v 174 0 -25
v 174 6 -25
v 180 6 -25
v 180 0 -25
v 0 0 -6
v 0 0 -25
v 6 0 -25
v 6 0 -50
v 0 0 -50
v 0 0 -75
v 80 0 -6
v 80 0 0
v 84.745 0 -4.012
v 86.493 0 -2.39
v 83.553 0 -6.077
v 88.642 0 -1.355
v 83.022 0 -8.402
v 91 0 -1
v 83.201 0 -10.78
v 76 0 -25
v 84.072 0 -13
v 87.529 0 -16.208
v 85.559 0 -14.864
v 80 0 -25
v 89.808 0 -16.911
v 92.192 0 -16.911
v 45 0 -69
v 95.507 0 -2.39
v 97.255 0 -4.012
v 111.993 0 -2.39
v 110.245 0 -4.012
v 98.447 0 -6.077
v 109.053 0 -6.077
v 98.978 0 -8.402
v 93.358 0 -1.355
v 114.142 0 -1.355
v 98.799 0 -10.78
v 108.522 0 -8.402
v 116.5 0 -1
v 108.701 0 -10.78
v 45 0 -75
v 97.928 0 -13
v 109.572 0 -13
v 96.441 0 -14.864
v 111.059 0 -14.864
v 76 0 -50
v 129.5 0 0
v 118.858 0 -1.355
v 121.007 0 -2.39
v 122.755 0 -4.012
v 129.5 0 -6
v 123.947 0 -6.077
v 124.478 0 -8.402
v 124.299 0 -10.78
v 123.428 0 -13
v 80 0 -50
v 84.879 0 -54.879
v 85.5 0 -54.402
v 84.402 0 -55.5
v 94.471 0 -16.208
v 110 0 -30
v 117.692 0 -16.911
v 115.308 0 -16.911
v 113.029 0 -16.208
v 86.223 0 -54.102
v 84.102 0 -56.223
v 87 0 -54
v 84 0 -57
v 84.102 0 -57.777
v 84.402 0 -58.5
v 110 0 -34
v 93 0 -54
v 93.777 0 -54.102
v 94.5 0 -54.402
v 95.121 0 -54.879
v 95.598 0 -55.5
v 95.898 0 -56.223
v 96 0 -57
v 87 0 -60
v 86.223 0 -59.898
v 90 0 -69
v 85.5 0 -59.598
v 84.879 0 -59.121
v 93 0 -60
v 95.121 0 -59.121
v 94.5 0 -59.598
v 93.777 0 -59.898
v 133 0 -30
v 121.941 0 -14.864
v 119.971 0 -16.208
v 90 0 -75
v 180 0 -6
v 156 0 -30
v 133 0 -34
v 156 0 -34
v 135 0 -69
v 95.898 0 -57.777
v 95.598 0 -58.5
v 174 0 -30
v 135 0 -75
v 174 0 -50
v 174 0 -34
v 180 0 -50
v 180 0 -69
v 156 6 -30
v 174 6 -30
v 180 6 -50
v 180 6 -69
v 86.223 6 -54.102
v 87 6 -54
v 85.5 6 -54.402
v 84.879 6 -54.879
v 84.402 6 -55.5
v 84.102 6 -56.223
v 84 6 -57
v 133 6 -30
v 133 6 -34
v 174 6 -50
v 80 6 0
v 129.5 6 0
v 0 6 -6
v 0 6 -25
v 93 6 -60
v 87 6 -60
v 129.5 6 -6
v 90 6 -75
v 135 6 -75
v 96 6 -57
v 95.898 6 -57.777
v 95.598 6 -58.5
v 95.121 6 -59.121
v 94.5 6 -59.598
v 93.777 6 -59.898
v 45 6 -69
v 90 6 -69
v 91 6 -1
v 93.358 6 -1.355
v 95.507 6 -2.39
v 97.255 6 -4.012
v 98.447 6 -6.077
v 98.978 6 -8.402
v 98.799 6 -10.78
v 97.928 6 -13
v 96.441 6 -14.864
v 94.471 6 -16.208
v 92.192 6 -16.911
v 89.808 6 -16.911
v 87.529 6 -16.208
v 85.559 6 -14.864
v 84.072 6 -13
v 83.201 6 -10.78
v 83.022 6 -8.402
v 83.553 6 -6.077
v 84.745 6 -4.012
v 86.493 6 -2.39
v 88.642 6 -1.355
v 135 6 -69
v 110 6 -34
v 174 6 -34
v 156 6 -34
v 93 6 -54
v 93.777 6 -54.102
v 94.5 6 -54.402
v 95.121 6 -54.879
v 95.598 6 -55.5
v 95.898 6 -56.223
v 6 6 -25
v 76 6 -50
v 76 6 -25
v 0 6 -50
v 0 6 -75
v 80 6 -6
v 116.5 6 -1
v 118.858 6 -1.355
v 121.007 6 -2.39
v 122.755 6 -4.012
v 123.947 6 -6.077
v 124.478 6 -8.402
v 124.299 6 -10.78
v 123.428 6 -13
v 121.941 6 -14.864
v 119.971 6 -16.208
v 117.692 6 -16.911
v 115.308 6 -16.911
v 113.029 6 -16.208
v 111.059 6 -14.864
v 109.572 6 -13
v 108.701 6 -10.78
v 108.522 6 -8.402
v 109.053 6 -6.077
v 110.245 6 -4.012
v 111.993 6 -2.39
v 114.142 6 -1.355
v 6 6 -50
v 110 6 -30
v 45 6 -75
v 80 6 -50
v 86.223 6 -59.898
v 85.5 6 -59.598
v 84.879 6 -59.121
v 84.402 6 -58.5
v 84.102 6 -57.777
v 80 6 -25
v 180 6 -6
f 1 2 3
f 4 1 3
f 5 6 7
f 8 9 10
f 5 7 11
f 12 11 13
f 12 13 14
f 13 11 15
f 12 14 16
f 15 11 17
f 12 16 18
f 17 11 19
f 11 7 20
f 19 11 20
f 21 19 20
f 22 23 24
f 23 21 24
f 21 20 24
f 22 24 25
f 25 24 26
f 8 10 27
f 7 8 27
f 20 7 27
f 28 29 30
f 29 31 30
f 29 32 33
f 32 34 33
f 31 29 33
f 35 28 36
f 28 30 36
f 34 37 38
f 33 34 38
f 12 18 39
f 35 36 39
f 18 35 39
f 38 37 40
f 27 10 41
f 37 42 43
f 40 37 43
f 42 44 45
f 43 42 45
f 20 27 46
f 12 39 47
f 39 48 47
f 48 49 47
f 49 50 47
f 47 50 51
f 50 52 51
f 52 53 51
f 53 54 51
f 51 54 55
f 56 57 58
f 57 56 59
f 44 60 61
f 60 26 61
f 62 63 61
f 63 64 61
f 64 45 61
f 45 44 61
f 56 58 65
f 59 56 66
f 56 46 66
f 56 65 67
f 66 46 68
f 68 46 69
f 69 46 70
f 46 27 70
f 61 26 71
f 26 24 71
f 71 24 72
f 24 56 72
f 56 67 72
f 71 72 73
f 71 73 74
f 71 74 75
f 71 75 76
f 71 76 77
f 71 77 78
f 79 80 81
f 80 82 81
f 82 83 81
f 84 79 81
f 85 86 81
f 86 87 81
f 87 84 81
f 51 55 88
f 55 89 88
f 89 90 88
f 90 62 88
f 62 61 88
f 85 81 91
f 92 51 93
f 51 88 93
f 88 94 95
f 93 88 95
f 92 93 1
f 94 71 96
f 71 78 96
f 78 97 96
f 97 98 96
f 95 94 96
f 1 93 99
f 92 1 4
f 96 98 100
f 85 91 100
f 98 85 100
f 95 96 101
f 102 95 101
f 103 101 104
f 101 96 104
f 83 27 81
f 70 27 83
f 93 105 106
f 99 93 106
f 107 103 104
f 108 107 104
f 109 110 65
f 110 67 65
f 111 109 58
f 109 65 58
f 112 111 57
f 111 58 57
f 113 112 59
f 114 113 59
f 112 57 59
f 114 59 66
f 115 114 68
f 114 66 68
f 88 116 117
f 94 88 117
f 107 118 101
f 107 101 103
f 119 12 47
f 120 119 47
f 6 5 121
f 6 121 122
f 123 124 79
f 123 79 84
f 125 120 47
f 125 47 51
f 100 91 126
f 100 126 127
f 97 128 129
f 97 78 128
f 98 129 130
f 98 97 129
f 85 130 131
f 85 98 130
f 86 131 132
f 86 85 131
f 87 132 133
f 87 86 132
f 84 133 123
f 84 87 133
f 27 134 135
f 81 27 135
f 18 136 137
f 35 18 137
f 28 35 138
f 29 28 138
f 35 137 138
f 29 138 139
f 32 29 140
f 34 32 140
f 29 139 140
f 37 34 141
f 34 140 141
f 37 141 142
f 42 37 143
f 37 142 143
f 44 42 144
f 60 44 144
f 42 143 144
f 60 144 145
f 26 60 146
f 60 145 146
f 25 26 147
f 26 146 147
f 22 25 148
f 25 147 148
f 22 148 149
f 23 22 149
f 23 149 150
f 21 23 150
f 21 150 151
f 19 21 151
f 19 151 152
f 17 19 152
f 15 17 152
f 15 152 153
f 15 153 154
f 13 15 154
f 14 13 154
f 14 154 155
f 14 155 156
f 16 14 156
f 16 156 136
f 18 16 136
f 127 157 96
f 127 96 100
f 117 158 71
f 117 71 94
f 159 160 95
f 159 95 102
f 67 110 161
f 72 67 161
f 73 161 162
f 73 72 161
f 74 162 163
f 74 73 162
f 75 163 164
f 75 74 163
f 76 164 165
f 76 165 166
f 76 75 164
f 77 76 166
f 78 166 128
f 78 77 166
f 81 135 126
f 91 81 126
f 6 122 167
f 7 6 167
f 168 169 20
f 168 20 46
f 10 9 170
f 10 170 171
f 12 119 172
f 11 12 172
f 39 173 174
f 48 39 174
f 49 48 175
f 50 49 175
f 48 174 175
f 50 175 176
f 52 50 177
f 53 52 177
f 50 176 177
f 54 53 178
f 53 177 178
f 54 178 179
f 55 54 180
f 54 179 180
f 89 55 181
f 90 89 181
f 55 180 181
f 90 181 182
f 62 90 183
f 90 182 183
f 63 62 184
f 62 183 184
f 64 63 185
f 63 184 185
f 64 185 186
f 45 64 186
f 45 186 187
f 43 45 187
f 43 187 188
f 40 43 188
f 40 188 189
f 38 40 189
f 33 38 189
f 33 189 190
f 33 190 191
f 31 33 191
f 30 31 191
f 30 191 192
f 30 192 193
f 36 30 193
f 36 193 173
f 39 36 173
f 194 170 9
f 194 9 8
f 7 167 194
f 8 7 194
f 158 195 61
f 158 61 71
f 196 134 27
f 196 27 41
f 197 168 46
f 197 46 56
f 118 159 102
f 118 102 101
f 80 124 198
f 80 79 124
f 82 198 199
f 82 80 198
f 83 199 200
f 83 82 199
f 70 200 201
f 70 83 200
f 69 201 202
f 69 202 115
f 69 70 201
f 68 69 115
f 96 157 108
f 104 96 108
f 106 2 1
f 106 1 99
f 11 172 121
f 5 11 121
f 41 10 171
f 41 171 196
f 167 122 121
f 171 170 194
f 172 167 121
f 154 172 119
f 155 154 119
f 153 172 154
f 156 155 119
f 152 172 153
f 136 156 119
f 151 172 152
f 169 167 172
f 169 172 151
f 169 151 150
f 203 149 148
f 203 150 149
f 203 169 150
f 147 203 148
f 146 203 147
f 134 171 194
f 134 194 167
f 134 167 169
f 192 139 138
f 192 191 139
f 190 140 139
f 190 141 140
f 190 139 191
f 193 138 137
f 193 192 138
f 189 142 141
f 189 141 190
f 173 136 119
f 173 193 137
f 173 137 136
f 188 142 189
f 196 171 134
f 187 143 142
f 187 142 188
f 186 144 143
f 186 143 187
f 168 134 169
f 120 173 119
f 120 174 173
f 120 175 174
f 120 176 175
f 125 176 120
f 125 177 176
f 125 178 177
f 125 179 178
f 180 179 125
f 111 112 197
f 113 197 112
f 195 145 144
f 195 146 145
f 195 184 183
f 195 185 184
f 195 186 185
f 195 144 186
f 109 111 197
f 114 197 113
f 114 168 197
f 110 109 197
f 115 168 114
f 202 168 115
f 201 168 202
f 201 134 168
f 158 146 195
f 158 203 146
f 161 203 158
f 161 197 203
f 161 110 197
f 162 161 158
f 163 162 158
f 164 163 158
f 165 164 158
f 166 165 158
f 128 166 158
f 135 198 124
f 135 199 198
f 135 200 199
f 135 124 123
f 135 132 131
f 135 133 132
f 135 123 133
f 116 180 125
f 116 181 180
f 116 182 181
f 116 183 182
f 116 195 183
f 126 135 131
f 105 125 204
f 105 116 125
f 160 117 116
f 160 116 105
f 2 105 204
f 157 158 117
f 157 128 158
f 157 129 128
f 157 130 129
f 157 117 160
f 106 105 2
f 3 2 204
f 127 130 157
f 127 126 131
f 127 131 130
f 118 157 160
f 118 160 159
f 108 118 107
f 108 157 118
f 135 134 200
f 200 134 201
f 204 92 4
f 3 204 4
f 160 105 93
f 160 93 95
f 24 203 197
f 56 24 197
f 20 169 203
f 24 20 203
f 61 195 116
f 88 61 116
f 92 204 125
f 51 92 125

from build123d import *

# Parameters (mm, degrees)
SKETCH1_W           = 180
SKETCH1_H           = 75
BOSS_EXTRUDE1_DEPTH = 6
SKETCH2_W           = 23
SKETCH2_H           = 4
SKETCH2_W_2         = 24
SKETCH2_W_3         = 4
SKETCH2_H_2         = 25
CUT_EXTRUDE1_DEPTH  = 6
SKETCH3_R           = 8
SKETCH3_W           = 12
SKETCH3_H           = 6
CUT_EXTRUDE5_DEPTH  = 196.092285855
FILLET1_R           = 3
SKETCH4_W           = 44.5
SKETCH4_H           = 6
SKETCH4_W_2         = 6
SKETCH4_H_2         = 5
SKETCH4_H_3         = 16
SKETCH4_H_4         = 25
SKETCH4_W_3         = 74
SKETCH4_W_4         = 45
CUT_EXTRUDE6_DEPTH  = 196.092285855


with BuildPart() as part:
    # Sketch1 → Boss-Extrude1 (new body)
    with BuildSketch(Plane(origin=(0, 0, 0), x_dir=(1, 0, 0), z_dir=(0, 1, 0))):
        with Locations((90, 37.5)):
            Rectangle(SKETCH1_W, SKETCH1_H)
    extrude(amount=BOSS_EXTRUDE1_DEPTH)

    # Sketch2 → Cut-Extrude1 (cut)
    with BuildSketch(Plane(origin=(0, 6, 0), x_dir=(1, 0, 0), z_dir=(0, 1, 0))):
        with Locations((121.5, 32)):
            Rectangle(SKETCH2_W, SKETCH2_H)
        with Locations((168, 32)):
            Rectangle(SKETCH2_W_2, SKETCH2_H)
        with Locations((78, 37.5)):
            Rectangle(SKETCH2_W_3, SKETCH2_H_2)
    extrude(amount=-CUT_EXTRUDE1_DEPTH, mode=Mode.SUBTRACT)

    # Sketch3 → Cut-Extrude5 (cut, through all)
    with BuildSketch(Plane(origin=(0, 6, 0), x_dir=(1, 0, 0), z_dir=(0, 1, 0))):
        with Locations(Location((91, 9, 0), (0, 0, 270))):
            Circle(SKETCH3_R)
        with Locations(Location((116.5, 9, 0), (0, 0, 270))):
            Circle(SKETCH3_R)
        with Locations((90, 57)):
            Rectangle(SKETCH3_W, SKETCH3_H)
    extrude(amount=-CUT_EXTRUDE5_DEPTH, mode=Mode.SUBTRACT)

    # Fillet1
    fillet1_edges = [part.edges().sort_by_distance(p)[0] for p in [
        (96, 3, -54),
        (96, 3, -60),
        (84, 3, -54),
        (84, 3, -60),
    ]]
    fillet(fillet1_edges, radius=FILLET1_R - 0.0001)  # a hair under: the kernel refuses the full size

    # Sketch4 → Cut-Extrude6 (cut, through all)
    with BuildSketch(Plane(origin=(0, 6, 0), x_dir=(1, 0, 0), z_dir=(0, 1, 0))):
        with Locations((151.75, 3)):
            Rectangle(SKETCH4_W, SKETCH4_H)
        with Locations((177, 3)):
            Rectangle(SKETCH4_W_2, SKETCH4_H)
        with Locations((177, 27.5)):
            Rectangle(SKETCH4_W_2, SKETCH4_H_2)
        with Locations((177, 42)):
            Rectangle(SKETCH4_W_2, SKETCH4_H_3)
        with Locations((3, 37.5)):
            Rectangle(SKETCH4_W_2, SKETCH4_H_4)
        with Locations((3, 3)):
            Rectangle(SKETCH4_W_2, SKETCH4_H)
        with Locations((43, 3)):
            Rectangle(SKETCH4_W_3, SKETCH4_H)
        with Locations((157.5, 72)):
            Rectangle(SKETCH4_W_4, SKETCH4_H)
        with Locations((67.5, 72)):
            Rectangle(SKETCH4_W_4, SKETCH4_H)
    extrude(amount=-CUT_EXTRUDE6_DEPTH, mode=Mode.SUBTRACT)


solid = part.part
